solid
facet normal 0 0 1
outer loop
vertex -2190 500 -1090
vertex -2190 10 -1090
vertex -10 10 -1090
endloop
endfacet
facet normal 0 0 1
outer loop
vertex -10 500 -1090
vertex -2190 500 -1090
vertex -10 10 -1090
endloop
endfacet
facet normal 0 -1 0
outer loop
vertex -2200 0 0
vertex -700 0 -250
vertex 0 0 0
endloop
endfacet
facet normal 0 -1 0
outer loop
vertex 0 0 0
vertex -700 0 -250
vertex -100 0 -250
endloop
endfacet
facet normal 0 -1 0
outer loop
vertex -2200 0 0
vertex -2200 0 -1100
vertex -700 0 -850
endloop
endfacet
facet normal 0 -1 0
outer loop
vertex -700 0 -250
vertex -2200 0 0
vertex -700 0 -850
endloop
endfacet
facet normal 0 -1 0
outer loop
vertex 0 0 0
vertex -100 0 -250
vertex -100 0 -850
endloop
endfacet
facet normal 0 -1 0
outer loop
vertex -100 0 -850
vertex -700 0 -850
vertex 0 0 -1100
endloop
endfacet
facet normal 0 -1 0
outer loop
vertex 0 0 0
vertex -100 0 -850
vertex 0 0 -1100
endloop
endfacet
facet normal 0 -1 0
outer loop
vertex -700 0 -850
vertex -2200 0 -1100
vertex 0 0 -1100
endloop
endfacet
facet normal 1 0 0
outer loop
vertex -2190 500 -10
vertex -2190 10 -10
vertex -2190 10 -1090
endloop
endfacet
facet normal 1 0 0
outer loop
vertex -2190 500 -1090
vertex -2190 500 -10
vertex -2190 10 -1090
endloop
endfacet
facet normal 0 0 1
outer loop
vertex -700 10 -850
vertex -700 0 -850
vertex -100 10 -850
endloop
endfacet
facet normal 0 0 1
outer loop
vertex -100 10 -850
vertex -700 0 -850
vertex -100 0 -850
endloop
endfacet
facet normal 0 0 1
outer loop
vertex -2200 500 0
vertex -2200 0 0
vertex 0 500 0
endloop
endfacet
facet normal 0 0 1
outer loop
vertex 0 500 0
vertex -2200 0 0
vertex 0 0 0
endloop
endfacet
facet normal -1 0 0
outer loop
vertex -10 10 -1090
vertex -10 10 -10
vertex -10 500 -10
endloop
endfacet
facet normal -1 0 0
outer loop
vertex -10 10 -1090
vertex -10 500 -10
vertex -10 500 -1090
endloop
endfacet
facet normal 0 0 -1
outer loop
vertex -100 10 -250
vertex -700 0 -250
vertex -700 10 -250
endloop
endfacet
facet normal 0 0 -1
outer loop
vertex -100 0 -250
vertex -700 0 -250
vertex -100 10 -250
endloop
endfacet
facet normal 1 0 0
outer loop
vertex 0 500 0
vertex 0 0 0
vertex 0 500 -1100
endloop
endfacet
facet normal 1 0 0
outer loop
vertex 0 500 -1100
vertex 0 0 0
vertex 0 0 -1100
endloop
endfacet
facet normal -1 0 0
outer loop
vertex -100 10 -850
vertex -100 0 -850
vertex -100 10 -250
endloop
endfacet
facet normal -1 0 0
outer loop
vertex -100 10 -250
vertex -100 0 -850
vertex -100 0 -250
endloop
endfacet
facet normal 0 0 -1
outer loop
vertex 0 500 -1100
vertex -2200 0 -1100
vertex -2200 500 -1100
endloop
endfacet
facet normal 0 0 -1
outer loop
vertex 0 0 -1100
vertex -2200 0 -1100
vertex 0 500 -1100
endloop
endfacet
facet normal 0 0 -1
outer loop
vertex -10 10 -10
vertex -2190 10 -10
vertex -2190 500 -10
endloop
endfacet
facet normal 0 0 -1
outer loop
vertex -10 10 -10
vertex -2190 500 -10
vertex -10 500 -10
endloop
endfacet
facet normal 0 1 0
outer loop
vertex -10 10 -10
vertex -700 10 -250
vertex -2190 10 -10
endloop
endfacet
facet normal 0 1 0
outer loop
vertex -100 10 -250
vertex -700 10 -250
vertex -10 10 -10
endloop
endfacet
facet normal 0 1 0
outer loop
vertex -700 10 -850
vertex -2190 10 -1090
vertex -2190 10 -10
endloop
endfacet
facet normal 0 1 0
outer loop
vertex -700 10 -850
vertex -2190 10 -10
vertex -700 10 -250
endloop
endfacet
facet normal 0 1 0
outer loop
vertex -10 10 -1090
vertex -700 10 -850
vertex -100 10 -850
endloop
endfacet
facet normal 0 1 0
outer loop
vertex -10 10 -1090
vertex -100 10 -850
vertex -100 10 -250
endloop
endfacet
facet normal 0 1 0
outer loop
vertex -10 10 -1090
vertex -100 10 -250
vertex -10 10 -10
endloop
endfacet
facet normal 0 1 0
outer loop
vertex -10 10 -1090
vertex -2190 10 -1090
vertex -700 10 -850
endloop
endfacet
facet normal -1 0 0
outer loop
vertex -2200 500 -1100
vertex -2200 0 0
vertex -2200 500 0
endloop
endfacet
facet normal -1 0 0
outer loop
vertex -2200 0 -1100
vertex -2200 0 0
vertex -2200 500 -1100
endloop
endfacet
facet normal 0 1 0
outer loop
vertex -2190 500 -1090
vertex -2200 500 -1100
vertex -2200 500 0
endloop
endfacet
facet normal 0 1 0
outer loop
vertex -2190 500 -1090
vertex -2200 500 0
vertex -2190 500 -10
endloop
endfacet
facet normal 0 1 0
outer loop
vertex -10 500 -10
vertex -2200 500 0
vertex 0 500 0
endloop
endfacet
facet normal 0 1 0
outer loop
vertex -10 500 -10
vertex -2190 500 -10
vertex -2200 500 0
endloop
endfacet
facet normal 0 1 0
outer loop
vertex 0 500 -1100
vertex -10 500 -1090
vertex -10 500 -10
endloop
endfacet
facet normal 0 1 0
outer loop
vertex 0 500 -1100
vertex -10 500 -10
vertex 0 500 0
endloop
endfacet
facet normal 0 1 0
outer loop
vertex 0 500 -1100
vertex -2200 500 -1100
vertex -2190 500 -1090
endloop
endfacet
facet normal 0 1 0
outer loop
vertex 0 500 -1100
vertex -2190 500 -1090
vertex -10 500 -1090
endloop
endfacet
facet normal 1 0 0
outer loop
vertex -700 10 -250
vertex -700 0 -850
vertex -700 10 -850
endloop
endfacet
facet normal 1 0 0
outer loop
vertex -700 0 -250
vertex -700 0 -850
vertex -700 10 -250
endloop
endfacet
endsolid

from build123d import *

# Parameters (mm, degrees)
SKETCH1_W          = 2200
SKETCH1_H          = 1100
EXTRUDE1_DEPTH     = 500
SHELL1_T           = -10
SKETCH2_W          = 600
SKETCH2_H          = 600
CUT_EXTRUDE1_DEPTH = 400


with BuildPart() as part:
    # Sketch1 → Extrude1 (new body)
    with BuildSketch(Plane(origin=(0, 0, 0), x_dir=(1, 0, 0), z_dir=(0, 1, 0))):
        with Locations((-1100, 550)):
            Rectangle(SKETCH1_W, SKETCH1_H)
    extrude(amount=EXTRUDE1_DEPTH)

    # Shell1
    shell1_openings = [part.faces().sort_by_distance(p)[0] for p in [
        (-1100, 500, -550),
    ]]
    offset(amount=SHELL1_T, openings=shell1_openings, kind=Kind.INTERSECTION)

    # Sketch2 → Cut-Extrude1 (cut)
    with BuildSketch(Plane.XZ):
        with Locations((-400, -550)):
            Rectangle(SKETCH2_W, SKETCH2_H)
    extrude(amount=-CUT_EXTRUDE1_DEPTH, mode=Mode.SUBTRACT)


solid = part.part
